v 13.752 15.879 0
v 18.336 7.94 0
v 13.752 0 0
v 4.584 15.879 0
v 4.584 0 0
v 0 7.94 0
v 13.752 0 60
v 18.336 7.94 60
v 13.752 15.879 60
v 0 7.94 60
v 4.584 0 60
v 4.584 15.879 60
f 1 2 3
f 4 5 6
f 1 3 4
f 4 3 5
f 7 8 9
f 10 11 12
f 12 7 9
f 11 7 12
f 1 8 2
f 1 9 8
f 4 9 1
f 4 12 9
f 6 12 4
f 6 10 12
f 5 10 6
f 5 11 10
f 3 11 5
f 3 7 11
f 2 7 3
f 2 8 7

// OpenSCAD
$fn = 32;

// ----------------------------------------------------------------------
// Key bar: hex key, 60 mm thick
// ----------------------------------------------------------------------

// --- parameters (mm) ---
profile_height = 60;      // extrusion height
profile_points = 6;       // points of the closed outline

profile = [[18.336, 7.94], [13.752, 15.879], [4.584, 15.879], [0, 7.94], [4.584, 0], [13.752, 0]];  // single closed polygon, 6 points, counter clockwise

// --- the one profile operation ---
linear_extrude(height = profile_height) polygon(points = profile);
